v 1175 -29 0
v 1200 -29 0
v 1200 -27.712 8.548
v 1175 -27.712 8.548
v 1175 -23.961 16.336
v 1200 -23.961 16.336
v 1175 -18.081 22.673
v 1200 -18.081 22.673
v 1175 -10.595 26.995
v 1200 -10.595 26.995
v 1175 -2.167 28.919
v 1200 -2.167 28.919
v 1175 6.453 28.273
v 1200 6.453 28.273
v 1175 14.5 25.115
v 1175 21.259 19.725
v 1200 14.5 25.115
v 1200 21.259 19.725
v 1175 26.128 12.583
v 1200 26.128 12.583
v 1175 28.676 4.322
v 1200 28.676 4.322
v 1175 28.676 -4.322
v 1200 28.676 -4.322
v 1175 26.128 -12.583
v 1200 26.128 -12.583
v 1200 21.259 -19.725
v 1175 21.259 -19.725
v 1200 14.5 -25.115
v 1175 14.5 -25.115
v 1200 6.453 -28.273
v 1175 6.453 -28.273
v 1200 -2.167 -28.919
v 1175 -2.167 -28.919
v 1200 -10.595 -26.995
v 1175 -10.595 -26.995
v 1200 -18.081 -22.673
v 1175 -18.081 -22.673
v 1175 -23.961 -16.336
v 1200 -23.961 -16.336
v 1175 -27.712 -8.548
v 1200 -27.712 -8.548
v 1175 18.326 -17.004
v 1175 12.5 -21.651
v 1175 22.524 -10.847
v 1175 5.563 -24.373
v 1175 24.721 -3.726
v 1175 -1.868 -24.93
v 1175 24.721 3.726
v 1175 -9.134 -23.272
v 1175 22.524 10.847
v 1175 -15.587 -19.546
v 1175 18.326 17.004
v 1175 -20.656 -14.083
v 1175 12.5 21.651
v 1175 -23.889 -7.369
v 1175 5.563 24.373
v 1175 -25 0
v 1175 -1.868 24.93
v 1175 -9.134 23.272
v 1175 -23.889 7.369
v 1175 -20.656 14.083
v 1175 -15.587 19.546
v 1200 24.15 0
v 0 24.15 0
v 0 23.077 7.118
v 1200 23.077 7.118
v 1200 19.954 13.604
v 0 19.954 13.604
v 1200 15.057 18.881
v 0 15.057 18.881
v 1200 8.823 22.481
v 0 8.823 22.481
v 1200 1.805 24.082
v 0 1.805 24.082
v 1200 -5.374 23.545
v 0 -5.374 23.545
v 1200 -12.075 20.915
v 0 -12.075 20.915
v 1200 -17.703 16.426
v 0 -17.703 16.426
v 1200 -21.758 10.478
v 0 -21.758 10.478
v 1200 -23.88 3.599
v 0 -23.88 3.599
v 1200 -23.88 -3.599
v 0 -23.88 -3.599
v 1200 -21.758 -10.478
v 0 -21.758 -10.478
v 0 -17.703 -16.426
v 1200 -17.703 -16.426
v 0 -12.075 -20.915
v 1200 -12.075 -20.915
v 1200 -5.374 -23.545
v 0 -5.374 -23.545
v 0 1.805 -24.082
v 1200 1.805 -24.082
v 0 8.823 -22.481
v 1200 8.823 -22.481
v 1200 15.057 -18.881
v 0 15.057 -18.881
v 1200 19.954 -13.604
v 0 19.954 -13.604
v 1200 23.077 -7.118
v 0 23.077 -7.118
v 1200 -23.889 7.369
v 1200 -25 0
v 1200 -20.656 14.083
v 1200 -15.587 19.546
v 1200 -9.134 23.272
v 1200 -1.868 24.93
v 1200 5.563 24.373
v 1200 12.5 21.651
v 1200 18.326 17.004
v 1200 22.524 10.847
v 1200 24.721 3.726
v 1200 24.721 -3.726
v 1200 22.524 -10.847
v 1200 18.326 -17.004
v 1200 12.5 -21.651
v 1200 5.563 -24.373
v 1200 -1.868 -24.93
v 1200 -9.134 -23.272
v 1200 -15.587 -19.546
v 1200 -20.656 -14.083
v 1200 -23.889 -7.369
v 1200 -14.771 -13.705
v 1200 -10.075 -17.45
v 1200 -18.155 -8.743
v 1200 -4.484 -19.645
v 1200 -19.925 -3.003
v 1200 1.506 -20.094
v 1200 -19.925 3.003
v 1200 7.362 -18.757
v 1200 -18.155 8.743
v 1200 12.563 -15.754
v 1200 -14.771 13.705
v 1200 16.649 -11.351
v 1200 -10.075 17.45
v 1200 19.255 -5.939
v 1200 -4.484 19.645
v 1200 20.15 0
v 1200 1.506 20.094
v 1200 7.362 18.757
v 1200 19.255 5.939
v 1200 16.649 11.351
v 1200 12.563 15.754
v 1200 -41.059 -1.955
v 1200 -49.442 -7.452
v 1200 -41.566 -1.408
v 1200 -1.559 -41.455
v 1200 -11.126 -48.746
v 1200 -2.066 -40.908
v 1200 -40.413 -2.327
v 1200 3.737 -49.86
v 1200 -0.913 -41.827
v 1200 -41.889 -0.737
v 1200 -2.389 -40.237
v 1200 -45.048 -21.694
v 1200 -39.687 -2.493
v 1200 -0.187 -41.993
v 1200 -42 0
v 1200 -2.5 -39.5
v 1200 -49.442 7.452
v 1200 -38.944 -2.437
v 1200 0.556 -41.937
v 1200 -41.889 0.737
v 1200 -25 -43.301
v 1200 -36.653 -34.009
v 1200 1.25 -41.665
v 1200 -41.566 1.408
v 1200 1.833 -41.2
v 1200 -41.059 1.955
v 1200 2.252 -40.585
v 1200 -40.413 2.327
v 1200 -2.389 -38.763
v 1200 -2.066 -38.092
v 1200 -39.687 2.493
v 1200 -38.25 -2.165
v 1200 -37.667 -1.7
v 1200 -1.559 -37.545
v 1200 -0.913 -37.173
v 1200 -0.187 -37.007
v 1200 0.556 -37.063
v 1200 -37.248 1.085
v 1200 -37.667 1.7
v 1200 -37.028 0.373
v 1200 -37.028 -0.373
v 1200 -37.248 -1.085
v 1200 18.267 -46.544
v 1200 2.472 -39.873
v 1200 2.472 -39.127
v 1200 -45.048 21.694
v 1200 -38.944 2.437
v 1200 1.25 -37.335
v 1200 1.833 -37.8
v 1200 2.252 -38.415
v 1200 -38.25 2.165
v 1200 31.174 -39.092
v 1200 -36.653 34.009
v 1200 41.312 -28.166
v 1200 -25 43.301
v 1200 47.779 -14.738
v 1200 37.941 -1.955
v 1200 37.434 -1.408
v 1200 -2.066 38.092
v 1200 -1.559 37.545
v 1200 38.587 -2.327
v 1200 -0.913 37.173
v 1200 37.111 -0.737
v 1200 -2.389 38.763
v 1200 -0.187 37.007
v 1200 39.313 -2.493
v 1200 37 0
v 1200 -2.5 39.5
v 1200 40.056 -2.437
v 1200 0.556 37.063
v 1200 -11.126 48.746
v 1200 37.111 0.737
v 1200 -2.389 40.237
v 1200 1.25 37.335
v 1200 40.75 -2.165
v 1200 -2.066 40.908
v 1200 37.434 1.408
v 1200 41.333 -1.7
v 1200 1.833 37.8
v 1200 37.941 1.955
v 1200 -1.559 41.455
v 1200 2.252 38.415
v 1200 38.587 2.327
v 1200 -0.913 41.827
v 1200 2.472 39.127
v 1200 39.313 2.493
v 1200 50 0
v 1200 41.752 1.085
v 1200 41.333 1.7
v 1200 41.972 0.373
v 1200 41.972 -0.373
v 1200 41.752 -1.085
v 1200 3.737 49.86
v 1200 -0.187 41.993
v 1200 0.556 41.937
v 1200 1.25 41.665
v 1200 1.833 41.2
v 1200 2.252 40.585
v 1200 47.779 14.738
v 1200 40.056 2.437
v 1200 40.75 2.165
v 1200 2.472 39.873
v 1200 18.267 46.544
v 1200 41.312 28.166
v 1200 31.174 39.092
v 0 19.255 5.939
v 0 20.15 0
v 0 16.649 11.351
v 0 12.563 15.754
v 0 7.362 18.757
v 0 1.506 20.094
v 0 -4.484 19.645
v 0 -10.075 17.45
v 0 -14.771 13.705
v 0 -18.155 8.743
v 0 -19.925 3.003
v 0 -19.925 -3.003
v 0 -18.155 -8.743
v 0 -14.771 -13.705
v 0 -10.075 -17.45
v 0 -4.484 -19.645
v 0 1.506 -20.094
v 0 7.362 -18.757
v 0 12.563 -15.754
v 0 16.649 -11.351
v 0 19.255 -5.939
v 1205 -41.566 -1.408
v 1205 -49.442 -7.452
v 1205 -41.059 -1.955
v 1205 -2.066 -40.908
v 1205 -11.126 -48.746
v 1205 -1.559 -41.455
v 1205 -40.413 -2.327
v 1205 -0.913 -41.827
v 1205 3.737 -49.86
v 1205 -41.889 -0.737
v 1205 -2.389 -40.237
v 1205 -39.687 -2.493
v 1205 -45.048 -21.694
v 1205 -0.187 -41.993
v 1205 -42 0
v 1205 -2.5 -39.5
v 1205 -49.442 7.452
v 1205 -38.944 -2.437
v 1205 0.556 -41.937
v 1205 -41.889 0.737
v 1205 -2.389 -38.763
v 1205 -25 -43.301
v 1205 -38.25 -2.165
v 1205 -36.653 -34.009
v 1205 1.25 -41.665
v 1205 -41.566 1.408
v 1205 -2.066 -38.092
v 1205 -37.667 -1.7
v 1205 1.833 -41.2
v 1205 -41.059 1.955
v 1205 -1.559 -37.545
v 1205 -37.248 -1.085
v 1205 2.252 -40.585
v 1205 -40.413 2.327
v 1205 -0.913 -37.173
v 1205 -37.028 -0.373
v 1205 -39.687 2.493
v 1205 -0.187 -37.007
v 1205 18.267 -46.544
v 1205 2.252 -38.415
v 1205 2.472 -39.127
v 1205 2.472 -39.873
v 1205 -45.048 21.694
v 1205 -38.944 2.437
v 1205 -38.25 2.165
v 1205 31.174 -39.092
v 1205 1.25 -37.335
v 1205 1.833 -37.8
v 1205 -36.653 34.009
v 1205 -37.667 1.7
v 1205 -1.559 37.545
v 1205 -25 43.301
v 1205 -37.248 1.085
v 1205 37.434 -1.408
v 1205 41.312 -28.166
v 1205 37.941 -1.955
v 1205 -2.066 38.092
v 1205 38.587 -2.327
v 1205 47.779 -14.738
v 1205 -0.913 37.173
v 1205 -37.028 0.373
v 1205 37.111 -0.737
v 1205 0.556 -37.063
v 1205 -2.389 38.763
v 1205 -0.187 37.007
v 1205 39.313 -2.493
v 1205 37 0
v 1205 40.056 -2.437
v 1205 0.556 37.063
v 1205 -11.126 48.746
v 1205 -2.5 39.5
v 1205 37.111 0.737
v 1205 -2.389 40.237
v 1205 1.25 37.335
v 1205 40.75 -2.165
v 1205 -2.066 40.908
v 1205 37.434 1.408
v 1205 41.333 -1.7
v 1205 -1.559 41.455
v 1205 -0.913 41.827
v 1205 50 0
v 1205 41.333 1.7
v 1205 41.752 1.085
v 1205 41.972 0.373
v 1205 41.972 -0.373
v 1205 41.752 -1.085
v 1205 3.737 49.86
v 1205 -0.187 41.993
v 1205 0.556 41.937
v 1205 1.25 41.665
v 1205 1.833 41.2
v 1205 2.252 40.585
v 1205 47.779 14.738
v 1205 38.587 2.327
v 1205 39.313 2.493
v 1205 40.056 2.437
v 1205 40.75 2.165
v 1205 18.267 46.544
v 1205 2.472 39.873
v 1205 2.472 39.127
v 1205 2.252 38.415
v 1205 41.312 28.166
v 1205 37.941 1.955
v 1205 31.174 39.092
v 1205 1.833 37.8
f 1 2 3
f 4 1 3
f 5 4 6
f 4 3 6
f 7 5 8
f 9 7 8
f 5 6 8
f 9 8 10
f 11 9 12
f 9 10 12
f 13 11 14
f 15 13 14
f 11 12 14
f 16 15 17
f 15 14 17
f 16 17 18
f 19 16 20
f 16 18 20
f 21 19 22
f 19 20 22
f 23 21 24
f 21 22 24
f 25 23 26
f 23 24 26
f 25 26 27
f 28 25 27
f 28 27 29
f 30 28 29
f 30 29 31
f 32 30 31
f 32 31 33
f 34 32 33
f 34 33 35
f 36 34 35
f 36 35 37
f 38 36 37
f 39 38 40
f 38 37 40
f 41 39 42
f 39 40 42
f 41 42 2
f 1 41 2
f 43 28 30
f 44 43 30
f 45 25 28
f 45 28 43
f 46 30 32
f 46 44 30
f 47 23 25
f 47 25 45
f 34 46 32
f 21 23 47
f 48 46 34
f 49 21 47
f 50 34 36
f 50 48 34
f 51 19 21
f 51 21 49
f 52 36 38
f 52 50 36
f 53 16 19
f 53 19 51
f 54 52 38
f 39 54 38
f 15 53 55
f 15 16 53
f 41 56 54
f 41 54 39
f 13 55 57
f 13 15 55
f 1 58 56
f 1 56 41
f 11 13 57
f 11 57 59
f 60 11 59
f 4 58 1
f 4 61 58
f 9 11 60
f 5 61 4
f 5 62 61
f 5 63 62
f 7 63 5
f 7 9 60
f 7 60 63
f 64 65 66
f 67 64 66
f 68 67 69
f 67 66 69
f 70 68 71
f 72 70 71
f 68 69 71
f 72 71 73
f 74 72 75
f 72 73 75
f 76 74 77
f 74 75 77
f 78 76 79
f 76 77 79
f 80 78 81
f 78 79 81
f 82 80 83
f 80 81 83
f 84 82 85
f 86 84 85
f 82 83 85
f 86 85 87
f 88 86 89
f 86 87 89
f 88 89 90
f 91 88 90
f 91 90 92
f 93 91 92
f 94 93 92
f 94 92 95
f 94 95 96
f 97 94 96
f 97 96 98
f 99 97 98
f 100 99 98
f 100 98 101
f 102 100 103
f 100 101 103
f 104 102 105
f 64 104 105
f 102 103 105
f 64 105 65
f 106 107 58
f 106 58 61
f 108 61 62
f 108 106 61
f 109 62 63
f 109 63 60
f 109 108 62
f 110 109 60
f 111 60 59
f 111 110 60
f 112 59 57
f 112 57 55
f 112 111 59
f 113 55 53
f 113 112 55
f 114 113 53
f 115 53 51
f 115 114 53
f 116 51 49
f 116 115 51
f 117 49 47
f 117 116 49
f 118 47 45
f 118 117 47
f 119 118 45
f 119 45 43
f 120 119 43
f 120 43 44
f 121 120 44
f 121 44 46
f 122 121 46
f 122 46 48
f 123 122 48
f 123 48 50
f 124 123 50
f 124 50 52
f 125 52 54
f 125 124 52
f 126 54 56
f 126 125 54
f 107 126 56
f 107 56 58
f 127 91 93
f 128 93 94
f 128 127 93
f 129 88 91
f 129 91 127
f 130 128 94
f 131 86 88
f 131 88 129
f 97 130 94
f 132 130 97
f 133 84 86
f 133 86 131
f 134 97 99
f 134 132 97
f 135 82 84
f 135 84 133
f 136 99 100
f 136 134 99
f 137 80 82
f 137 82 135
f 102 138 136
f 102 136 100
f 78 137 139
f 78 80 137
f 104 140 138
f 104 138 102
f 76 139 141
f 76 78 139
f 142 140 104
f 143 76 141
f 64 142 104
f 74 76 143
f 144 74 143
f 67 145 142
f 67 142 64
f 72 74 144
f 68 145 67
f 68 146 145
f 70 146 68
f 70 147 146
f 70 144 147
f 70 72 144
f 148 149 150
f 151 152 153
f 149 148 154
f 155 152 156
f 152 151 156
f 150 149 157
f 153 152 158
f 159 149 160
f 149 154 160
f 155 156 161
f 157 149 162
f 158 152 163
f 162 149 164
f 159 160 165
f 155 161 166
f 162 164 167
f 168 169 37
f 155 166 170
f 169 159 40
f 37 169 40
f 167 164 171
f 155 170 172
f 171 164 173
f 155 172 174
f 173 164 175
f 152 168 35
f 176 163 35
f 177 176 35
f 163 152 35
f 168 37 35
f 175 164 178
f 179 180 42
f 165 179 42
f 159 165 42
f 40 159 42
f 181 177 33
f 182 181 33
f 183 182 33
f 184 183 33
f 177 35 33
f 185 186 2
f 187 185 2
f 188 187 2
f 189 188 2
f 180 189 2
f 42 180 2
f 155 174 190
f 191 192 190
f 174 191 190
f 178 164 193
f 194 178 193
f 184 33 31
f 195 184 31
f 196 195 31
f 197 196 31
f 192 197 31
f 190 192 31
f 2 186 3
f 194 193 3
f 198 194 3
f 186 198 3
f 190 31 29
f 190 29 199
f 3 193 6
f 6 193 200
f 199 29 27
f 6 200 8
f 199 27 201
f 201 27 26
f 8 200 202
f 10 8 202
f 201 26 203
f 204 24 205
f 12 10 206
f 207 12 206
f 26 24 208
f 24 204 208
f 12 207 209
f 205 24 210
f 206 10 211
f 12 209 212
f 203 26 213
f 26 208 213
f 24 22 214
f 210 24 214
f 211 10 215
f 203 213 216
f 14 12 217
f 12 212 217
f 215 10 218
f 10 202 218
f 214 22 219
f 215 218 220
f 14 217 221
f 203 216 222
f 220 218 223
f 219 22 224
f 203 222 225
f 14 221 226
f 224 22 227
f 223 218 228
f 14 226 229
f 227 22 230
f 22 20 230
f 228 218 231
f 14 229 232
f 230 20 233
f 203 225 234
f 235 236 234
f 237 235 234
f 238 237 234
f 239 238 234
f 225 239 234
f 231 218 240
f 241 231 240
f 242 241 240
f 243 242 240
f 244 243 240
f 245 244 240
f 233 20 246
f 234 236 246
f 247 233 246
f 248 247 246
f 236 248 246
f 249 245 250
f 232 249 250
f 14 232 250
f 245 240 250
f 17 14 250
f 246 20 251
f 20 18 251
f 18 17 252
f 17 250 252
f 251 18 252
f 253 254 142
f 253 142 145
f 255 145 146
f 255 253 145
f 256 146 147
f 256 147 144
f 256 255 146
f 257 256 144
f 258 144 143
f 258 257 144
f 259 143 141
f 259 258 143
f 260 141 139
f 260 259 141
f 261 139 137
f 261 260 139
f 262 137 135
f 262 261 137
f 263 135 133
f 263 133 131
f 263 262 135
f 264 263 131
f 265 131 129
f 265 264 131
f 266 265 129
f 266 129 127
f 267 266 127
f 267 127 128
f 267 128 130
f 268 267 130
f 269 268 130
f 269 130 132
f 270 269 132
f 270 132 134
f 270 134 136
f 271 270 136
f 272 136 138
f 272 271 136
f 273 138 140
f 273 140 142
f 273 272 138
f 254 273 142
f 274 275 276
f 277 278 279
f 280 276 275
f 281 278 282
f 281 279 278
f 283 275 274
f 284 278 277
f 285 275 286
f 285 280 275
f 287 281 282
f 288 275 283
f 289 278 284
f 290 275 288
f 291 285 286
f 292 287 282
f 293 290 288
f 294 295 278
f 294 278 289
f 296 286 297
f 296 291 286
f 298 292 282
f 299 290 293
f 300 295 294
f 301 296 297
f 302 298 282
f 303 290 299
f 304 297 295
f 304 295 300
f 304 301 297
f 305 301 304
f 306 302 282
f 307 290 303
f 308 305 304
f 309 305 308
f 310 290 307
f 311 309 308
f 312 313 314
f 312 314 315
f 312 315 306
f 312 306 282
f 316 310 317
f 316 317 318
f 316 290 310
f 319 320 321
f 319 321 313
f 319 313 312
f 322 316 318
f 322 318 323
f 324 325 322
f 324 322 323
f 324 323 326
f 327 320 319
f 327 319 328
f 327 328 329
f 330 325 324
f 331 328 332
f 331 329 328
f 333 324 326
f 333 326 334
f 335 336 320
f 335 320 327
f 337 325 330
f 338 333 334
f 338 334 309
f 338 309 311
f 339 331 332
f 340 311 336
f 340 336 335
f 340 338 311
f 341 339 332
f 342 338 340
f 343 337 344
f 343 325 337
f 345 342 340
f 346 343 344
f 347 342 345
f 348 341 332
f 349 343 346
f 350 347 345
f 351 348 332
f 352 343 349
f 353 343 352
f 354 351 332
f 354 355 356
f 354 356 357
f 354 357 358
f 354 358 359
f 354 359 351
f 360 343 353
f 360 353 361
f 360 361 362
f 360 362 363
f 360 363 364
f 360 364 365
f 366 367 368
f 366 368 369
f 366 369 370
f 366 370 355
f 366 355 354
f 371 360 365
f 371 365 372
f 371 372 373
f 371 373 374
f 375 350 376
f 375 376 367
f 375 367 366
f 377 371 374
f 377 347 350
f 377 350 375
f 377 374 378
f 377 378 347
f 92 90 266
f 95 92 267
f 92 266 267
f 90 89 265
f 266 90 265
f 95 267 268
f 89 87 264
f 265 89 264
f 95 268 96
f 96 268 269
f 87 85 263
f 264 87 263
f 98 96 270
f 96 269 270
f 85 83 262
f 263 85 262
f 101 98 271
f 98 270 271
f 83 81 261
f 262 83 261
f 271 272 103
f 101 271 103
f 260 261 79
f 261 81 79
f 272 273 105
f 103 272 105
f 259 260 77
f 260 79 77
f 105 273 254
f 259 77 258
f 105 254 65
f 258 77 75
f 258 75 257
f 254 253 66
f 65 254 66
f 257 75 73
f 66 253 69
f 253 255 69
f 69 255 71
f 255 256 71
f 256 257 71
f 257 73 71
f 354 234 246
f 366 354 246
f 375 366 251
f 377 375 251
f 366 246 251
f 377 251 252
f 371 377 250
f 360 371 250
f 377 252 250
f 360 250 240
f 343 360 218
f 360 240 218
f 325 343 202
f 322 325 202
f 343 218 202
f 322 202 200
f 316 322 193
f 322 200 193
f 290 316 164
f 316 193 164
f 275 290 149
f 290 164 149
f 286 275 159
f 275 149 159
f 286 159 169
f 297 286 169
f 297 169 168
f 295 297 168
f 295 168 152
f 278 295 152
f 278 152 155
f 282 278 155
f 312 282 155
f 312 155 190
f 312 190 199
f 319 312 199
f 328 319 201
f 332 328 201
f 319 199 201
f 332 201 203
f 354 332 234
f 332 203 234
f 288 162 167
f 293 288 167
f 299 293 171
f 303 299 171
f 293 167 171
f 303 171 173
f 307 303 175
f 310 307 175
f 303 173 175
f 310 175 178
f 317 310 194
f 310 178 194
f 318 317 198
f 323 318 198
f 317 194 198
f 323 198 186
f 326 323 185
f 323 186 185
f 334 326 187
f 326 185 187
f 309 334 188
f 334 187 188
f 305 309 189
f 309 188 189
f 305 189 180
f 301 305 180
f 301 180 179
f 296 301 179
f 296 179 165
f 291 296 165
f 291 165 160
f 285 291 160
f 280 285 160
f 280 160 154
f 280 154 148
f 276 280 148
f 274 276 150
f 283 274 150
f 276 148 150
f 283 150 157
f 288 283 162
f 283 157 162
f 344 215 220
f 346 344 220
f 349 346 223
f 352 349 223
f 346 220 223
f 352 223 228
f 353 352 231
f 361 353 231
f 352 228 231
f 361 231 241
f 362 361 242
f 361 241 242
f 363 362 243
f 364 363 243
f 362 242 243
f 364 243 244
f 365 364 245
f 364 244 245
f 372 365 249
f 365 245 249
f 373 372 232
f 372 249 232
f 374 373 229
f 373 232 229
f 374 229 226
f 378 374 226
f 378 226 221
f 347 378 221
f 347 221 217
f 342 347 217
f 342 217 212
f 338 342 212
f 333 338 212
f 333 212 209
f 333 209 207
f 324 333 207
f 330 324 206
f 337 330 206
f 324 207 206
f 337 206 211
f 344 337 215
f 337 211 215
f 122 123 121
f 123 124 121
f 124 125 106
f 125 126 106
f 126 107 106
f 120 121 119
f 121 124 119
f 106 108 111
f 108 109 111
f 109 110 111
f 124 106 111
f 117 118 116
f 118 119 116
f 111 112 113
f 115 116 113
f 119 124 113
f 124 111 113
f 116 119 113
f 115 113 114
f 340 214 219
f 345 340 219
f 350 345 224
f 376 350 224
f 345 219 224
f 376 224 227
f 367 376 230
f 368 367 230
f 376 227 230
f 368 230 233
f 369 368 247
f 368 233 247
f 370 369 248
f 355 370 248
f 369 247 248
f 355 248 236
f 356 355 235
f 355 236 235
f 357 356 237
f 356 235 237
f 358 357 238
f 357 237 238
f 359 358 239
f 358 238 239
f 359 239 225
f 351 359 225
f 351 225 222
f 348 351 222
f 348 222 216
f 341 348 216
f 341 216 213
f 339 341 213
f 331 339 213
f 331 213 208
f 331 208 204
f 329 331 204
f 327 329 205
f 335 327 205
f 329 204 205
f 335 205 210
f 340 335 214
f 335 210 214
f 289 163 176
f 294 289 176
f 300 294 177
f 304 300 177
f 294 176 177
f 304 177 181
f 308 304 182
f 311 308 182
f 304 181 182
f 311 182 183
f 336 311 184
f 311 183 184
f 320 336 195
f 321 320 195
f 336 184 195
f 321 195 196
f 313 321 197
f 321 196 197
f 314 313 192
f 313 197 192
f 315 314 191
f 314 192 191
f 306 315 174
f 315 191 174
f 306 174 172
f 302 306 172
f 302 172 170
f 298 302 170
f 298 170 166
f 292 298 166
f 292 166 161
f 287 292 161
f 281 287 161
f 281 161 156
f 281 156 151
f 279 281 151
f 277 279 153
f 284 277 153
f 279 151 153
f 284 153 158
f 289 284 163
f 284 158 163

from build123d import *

# Parameters (mm, degrees)
F0_R     = 24.15
F0_R_2   = 20.15
F1_DEPTH = 1200
F2_R     = 50
F3_DEPTH = 5
F4_R     = 29
F4_R_2   = 25
F5_DEPTH = 25
F6_R     = 2.5
F7_DEPTH = 5


with BuildPart() as f1:
    # F0 (on Right) → F1 (new body)
    with BuildSketch(Plane.YZ):
        Circle(F0_R)
        Circle(F0_R_2, mode=Mode.SUBTRACT)
    extrude(amount=F1_DEPTH)


with BuildPart() as f3:
    # F2 (on face) → F3 (new body)
    with BuildSketch(Plane.YZ.offset(1200)):
        Circle(F2_R)
    extrude(amount=F3_DEPTH)

    # F4 (on face) → F5 (join)
    with BuildSketch(Plane(origin=(1200, 0, 0), x_dir=(0, -1, 0), z_dir=(-1, 0, 0))):
        Circle(F4_R)
        Circle(F4_R_2, mode=Mode.SUBTRACT)
    extrude(amount=F5_DEPTH)

    # F6 (on face) → F7 (cut, through all)
    with BuildSketch(Plane(origin=(1200, 0, 0), x_dir=(0, -1, 0), z_dir=(-1, 0, 0))):
        with Locations((-39.5, 0)):
            Circle(F6_R)
        with Locations((39.5, 0)):
            Circle(F6_R)
        with Locations((0, 39.5)):
            Circle(F6_R)
        with Locations((0, -39.5)):
            Circle(F6_R)
    extrude(amount=-F7_DEPTH, mode=Mode.SUBTRACT)


solid = Compound([f1.part, f3.part])
